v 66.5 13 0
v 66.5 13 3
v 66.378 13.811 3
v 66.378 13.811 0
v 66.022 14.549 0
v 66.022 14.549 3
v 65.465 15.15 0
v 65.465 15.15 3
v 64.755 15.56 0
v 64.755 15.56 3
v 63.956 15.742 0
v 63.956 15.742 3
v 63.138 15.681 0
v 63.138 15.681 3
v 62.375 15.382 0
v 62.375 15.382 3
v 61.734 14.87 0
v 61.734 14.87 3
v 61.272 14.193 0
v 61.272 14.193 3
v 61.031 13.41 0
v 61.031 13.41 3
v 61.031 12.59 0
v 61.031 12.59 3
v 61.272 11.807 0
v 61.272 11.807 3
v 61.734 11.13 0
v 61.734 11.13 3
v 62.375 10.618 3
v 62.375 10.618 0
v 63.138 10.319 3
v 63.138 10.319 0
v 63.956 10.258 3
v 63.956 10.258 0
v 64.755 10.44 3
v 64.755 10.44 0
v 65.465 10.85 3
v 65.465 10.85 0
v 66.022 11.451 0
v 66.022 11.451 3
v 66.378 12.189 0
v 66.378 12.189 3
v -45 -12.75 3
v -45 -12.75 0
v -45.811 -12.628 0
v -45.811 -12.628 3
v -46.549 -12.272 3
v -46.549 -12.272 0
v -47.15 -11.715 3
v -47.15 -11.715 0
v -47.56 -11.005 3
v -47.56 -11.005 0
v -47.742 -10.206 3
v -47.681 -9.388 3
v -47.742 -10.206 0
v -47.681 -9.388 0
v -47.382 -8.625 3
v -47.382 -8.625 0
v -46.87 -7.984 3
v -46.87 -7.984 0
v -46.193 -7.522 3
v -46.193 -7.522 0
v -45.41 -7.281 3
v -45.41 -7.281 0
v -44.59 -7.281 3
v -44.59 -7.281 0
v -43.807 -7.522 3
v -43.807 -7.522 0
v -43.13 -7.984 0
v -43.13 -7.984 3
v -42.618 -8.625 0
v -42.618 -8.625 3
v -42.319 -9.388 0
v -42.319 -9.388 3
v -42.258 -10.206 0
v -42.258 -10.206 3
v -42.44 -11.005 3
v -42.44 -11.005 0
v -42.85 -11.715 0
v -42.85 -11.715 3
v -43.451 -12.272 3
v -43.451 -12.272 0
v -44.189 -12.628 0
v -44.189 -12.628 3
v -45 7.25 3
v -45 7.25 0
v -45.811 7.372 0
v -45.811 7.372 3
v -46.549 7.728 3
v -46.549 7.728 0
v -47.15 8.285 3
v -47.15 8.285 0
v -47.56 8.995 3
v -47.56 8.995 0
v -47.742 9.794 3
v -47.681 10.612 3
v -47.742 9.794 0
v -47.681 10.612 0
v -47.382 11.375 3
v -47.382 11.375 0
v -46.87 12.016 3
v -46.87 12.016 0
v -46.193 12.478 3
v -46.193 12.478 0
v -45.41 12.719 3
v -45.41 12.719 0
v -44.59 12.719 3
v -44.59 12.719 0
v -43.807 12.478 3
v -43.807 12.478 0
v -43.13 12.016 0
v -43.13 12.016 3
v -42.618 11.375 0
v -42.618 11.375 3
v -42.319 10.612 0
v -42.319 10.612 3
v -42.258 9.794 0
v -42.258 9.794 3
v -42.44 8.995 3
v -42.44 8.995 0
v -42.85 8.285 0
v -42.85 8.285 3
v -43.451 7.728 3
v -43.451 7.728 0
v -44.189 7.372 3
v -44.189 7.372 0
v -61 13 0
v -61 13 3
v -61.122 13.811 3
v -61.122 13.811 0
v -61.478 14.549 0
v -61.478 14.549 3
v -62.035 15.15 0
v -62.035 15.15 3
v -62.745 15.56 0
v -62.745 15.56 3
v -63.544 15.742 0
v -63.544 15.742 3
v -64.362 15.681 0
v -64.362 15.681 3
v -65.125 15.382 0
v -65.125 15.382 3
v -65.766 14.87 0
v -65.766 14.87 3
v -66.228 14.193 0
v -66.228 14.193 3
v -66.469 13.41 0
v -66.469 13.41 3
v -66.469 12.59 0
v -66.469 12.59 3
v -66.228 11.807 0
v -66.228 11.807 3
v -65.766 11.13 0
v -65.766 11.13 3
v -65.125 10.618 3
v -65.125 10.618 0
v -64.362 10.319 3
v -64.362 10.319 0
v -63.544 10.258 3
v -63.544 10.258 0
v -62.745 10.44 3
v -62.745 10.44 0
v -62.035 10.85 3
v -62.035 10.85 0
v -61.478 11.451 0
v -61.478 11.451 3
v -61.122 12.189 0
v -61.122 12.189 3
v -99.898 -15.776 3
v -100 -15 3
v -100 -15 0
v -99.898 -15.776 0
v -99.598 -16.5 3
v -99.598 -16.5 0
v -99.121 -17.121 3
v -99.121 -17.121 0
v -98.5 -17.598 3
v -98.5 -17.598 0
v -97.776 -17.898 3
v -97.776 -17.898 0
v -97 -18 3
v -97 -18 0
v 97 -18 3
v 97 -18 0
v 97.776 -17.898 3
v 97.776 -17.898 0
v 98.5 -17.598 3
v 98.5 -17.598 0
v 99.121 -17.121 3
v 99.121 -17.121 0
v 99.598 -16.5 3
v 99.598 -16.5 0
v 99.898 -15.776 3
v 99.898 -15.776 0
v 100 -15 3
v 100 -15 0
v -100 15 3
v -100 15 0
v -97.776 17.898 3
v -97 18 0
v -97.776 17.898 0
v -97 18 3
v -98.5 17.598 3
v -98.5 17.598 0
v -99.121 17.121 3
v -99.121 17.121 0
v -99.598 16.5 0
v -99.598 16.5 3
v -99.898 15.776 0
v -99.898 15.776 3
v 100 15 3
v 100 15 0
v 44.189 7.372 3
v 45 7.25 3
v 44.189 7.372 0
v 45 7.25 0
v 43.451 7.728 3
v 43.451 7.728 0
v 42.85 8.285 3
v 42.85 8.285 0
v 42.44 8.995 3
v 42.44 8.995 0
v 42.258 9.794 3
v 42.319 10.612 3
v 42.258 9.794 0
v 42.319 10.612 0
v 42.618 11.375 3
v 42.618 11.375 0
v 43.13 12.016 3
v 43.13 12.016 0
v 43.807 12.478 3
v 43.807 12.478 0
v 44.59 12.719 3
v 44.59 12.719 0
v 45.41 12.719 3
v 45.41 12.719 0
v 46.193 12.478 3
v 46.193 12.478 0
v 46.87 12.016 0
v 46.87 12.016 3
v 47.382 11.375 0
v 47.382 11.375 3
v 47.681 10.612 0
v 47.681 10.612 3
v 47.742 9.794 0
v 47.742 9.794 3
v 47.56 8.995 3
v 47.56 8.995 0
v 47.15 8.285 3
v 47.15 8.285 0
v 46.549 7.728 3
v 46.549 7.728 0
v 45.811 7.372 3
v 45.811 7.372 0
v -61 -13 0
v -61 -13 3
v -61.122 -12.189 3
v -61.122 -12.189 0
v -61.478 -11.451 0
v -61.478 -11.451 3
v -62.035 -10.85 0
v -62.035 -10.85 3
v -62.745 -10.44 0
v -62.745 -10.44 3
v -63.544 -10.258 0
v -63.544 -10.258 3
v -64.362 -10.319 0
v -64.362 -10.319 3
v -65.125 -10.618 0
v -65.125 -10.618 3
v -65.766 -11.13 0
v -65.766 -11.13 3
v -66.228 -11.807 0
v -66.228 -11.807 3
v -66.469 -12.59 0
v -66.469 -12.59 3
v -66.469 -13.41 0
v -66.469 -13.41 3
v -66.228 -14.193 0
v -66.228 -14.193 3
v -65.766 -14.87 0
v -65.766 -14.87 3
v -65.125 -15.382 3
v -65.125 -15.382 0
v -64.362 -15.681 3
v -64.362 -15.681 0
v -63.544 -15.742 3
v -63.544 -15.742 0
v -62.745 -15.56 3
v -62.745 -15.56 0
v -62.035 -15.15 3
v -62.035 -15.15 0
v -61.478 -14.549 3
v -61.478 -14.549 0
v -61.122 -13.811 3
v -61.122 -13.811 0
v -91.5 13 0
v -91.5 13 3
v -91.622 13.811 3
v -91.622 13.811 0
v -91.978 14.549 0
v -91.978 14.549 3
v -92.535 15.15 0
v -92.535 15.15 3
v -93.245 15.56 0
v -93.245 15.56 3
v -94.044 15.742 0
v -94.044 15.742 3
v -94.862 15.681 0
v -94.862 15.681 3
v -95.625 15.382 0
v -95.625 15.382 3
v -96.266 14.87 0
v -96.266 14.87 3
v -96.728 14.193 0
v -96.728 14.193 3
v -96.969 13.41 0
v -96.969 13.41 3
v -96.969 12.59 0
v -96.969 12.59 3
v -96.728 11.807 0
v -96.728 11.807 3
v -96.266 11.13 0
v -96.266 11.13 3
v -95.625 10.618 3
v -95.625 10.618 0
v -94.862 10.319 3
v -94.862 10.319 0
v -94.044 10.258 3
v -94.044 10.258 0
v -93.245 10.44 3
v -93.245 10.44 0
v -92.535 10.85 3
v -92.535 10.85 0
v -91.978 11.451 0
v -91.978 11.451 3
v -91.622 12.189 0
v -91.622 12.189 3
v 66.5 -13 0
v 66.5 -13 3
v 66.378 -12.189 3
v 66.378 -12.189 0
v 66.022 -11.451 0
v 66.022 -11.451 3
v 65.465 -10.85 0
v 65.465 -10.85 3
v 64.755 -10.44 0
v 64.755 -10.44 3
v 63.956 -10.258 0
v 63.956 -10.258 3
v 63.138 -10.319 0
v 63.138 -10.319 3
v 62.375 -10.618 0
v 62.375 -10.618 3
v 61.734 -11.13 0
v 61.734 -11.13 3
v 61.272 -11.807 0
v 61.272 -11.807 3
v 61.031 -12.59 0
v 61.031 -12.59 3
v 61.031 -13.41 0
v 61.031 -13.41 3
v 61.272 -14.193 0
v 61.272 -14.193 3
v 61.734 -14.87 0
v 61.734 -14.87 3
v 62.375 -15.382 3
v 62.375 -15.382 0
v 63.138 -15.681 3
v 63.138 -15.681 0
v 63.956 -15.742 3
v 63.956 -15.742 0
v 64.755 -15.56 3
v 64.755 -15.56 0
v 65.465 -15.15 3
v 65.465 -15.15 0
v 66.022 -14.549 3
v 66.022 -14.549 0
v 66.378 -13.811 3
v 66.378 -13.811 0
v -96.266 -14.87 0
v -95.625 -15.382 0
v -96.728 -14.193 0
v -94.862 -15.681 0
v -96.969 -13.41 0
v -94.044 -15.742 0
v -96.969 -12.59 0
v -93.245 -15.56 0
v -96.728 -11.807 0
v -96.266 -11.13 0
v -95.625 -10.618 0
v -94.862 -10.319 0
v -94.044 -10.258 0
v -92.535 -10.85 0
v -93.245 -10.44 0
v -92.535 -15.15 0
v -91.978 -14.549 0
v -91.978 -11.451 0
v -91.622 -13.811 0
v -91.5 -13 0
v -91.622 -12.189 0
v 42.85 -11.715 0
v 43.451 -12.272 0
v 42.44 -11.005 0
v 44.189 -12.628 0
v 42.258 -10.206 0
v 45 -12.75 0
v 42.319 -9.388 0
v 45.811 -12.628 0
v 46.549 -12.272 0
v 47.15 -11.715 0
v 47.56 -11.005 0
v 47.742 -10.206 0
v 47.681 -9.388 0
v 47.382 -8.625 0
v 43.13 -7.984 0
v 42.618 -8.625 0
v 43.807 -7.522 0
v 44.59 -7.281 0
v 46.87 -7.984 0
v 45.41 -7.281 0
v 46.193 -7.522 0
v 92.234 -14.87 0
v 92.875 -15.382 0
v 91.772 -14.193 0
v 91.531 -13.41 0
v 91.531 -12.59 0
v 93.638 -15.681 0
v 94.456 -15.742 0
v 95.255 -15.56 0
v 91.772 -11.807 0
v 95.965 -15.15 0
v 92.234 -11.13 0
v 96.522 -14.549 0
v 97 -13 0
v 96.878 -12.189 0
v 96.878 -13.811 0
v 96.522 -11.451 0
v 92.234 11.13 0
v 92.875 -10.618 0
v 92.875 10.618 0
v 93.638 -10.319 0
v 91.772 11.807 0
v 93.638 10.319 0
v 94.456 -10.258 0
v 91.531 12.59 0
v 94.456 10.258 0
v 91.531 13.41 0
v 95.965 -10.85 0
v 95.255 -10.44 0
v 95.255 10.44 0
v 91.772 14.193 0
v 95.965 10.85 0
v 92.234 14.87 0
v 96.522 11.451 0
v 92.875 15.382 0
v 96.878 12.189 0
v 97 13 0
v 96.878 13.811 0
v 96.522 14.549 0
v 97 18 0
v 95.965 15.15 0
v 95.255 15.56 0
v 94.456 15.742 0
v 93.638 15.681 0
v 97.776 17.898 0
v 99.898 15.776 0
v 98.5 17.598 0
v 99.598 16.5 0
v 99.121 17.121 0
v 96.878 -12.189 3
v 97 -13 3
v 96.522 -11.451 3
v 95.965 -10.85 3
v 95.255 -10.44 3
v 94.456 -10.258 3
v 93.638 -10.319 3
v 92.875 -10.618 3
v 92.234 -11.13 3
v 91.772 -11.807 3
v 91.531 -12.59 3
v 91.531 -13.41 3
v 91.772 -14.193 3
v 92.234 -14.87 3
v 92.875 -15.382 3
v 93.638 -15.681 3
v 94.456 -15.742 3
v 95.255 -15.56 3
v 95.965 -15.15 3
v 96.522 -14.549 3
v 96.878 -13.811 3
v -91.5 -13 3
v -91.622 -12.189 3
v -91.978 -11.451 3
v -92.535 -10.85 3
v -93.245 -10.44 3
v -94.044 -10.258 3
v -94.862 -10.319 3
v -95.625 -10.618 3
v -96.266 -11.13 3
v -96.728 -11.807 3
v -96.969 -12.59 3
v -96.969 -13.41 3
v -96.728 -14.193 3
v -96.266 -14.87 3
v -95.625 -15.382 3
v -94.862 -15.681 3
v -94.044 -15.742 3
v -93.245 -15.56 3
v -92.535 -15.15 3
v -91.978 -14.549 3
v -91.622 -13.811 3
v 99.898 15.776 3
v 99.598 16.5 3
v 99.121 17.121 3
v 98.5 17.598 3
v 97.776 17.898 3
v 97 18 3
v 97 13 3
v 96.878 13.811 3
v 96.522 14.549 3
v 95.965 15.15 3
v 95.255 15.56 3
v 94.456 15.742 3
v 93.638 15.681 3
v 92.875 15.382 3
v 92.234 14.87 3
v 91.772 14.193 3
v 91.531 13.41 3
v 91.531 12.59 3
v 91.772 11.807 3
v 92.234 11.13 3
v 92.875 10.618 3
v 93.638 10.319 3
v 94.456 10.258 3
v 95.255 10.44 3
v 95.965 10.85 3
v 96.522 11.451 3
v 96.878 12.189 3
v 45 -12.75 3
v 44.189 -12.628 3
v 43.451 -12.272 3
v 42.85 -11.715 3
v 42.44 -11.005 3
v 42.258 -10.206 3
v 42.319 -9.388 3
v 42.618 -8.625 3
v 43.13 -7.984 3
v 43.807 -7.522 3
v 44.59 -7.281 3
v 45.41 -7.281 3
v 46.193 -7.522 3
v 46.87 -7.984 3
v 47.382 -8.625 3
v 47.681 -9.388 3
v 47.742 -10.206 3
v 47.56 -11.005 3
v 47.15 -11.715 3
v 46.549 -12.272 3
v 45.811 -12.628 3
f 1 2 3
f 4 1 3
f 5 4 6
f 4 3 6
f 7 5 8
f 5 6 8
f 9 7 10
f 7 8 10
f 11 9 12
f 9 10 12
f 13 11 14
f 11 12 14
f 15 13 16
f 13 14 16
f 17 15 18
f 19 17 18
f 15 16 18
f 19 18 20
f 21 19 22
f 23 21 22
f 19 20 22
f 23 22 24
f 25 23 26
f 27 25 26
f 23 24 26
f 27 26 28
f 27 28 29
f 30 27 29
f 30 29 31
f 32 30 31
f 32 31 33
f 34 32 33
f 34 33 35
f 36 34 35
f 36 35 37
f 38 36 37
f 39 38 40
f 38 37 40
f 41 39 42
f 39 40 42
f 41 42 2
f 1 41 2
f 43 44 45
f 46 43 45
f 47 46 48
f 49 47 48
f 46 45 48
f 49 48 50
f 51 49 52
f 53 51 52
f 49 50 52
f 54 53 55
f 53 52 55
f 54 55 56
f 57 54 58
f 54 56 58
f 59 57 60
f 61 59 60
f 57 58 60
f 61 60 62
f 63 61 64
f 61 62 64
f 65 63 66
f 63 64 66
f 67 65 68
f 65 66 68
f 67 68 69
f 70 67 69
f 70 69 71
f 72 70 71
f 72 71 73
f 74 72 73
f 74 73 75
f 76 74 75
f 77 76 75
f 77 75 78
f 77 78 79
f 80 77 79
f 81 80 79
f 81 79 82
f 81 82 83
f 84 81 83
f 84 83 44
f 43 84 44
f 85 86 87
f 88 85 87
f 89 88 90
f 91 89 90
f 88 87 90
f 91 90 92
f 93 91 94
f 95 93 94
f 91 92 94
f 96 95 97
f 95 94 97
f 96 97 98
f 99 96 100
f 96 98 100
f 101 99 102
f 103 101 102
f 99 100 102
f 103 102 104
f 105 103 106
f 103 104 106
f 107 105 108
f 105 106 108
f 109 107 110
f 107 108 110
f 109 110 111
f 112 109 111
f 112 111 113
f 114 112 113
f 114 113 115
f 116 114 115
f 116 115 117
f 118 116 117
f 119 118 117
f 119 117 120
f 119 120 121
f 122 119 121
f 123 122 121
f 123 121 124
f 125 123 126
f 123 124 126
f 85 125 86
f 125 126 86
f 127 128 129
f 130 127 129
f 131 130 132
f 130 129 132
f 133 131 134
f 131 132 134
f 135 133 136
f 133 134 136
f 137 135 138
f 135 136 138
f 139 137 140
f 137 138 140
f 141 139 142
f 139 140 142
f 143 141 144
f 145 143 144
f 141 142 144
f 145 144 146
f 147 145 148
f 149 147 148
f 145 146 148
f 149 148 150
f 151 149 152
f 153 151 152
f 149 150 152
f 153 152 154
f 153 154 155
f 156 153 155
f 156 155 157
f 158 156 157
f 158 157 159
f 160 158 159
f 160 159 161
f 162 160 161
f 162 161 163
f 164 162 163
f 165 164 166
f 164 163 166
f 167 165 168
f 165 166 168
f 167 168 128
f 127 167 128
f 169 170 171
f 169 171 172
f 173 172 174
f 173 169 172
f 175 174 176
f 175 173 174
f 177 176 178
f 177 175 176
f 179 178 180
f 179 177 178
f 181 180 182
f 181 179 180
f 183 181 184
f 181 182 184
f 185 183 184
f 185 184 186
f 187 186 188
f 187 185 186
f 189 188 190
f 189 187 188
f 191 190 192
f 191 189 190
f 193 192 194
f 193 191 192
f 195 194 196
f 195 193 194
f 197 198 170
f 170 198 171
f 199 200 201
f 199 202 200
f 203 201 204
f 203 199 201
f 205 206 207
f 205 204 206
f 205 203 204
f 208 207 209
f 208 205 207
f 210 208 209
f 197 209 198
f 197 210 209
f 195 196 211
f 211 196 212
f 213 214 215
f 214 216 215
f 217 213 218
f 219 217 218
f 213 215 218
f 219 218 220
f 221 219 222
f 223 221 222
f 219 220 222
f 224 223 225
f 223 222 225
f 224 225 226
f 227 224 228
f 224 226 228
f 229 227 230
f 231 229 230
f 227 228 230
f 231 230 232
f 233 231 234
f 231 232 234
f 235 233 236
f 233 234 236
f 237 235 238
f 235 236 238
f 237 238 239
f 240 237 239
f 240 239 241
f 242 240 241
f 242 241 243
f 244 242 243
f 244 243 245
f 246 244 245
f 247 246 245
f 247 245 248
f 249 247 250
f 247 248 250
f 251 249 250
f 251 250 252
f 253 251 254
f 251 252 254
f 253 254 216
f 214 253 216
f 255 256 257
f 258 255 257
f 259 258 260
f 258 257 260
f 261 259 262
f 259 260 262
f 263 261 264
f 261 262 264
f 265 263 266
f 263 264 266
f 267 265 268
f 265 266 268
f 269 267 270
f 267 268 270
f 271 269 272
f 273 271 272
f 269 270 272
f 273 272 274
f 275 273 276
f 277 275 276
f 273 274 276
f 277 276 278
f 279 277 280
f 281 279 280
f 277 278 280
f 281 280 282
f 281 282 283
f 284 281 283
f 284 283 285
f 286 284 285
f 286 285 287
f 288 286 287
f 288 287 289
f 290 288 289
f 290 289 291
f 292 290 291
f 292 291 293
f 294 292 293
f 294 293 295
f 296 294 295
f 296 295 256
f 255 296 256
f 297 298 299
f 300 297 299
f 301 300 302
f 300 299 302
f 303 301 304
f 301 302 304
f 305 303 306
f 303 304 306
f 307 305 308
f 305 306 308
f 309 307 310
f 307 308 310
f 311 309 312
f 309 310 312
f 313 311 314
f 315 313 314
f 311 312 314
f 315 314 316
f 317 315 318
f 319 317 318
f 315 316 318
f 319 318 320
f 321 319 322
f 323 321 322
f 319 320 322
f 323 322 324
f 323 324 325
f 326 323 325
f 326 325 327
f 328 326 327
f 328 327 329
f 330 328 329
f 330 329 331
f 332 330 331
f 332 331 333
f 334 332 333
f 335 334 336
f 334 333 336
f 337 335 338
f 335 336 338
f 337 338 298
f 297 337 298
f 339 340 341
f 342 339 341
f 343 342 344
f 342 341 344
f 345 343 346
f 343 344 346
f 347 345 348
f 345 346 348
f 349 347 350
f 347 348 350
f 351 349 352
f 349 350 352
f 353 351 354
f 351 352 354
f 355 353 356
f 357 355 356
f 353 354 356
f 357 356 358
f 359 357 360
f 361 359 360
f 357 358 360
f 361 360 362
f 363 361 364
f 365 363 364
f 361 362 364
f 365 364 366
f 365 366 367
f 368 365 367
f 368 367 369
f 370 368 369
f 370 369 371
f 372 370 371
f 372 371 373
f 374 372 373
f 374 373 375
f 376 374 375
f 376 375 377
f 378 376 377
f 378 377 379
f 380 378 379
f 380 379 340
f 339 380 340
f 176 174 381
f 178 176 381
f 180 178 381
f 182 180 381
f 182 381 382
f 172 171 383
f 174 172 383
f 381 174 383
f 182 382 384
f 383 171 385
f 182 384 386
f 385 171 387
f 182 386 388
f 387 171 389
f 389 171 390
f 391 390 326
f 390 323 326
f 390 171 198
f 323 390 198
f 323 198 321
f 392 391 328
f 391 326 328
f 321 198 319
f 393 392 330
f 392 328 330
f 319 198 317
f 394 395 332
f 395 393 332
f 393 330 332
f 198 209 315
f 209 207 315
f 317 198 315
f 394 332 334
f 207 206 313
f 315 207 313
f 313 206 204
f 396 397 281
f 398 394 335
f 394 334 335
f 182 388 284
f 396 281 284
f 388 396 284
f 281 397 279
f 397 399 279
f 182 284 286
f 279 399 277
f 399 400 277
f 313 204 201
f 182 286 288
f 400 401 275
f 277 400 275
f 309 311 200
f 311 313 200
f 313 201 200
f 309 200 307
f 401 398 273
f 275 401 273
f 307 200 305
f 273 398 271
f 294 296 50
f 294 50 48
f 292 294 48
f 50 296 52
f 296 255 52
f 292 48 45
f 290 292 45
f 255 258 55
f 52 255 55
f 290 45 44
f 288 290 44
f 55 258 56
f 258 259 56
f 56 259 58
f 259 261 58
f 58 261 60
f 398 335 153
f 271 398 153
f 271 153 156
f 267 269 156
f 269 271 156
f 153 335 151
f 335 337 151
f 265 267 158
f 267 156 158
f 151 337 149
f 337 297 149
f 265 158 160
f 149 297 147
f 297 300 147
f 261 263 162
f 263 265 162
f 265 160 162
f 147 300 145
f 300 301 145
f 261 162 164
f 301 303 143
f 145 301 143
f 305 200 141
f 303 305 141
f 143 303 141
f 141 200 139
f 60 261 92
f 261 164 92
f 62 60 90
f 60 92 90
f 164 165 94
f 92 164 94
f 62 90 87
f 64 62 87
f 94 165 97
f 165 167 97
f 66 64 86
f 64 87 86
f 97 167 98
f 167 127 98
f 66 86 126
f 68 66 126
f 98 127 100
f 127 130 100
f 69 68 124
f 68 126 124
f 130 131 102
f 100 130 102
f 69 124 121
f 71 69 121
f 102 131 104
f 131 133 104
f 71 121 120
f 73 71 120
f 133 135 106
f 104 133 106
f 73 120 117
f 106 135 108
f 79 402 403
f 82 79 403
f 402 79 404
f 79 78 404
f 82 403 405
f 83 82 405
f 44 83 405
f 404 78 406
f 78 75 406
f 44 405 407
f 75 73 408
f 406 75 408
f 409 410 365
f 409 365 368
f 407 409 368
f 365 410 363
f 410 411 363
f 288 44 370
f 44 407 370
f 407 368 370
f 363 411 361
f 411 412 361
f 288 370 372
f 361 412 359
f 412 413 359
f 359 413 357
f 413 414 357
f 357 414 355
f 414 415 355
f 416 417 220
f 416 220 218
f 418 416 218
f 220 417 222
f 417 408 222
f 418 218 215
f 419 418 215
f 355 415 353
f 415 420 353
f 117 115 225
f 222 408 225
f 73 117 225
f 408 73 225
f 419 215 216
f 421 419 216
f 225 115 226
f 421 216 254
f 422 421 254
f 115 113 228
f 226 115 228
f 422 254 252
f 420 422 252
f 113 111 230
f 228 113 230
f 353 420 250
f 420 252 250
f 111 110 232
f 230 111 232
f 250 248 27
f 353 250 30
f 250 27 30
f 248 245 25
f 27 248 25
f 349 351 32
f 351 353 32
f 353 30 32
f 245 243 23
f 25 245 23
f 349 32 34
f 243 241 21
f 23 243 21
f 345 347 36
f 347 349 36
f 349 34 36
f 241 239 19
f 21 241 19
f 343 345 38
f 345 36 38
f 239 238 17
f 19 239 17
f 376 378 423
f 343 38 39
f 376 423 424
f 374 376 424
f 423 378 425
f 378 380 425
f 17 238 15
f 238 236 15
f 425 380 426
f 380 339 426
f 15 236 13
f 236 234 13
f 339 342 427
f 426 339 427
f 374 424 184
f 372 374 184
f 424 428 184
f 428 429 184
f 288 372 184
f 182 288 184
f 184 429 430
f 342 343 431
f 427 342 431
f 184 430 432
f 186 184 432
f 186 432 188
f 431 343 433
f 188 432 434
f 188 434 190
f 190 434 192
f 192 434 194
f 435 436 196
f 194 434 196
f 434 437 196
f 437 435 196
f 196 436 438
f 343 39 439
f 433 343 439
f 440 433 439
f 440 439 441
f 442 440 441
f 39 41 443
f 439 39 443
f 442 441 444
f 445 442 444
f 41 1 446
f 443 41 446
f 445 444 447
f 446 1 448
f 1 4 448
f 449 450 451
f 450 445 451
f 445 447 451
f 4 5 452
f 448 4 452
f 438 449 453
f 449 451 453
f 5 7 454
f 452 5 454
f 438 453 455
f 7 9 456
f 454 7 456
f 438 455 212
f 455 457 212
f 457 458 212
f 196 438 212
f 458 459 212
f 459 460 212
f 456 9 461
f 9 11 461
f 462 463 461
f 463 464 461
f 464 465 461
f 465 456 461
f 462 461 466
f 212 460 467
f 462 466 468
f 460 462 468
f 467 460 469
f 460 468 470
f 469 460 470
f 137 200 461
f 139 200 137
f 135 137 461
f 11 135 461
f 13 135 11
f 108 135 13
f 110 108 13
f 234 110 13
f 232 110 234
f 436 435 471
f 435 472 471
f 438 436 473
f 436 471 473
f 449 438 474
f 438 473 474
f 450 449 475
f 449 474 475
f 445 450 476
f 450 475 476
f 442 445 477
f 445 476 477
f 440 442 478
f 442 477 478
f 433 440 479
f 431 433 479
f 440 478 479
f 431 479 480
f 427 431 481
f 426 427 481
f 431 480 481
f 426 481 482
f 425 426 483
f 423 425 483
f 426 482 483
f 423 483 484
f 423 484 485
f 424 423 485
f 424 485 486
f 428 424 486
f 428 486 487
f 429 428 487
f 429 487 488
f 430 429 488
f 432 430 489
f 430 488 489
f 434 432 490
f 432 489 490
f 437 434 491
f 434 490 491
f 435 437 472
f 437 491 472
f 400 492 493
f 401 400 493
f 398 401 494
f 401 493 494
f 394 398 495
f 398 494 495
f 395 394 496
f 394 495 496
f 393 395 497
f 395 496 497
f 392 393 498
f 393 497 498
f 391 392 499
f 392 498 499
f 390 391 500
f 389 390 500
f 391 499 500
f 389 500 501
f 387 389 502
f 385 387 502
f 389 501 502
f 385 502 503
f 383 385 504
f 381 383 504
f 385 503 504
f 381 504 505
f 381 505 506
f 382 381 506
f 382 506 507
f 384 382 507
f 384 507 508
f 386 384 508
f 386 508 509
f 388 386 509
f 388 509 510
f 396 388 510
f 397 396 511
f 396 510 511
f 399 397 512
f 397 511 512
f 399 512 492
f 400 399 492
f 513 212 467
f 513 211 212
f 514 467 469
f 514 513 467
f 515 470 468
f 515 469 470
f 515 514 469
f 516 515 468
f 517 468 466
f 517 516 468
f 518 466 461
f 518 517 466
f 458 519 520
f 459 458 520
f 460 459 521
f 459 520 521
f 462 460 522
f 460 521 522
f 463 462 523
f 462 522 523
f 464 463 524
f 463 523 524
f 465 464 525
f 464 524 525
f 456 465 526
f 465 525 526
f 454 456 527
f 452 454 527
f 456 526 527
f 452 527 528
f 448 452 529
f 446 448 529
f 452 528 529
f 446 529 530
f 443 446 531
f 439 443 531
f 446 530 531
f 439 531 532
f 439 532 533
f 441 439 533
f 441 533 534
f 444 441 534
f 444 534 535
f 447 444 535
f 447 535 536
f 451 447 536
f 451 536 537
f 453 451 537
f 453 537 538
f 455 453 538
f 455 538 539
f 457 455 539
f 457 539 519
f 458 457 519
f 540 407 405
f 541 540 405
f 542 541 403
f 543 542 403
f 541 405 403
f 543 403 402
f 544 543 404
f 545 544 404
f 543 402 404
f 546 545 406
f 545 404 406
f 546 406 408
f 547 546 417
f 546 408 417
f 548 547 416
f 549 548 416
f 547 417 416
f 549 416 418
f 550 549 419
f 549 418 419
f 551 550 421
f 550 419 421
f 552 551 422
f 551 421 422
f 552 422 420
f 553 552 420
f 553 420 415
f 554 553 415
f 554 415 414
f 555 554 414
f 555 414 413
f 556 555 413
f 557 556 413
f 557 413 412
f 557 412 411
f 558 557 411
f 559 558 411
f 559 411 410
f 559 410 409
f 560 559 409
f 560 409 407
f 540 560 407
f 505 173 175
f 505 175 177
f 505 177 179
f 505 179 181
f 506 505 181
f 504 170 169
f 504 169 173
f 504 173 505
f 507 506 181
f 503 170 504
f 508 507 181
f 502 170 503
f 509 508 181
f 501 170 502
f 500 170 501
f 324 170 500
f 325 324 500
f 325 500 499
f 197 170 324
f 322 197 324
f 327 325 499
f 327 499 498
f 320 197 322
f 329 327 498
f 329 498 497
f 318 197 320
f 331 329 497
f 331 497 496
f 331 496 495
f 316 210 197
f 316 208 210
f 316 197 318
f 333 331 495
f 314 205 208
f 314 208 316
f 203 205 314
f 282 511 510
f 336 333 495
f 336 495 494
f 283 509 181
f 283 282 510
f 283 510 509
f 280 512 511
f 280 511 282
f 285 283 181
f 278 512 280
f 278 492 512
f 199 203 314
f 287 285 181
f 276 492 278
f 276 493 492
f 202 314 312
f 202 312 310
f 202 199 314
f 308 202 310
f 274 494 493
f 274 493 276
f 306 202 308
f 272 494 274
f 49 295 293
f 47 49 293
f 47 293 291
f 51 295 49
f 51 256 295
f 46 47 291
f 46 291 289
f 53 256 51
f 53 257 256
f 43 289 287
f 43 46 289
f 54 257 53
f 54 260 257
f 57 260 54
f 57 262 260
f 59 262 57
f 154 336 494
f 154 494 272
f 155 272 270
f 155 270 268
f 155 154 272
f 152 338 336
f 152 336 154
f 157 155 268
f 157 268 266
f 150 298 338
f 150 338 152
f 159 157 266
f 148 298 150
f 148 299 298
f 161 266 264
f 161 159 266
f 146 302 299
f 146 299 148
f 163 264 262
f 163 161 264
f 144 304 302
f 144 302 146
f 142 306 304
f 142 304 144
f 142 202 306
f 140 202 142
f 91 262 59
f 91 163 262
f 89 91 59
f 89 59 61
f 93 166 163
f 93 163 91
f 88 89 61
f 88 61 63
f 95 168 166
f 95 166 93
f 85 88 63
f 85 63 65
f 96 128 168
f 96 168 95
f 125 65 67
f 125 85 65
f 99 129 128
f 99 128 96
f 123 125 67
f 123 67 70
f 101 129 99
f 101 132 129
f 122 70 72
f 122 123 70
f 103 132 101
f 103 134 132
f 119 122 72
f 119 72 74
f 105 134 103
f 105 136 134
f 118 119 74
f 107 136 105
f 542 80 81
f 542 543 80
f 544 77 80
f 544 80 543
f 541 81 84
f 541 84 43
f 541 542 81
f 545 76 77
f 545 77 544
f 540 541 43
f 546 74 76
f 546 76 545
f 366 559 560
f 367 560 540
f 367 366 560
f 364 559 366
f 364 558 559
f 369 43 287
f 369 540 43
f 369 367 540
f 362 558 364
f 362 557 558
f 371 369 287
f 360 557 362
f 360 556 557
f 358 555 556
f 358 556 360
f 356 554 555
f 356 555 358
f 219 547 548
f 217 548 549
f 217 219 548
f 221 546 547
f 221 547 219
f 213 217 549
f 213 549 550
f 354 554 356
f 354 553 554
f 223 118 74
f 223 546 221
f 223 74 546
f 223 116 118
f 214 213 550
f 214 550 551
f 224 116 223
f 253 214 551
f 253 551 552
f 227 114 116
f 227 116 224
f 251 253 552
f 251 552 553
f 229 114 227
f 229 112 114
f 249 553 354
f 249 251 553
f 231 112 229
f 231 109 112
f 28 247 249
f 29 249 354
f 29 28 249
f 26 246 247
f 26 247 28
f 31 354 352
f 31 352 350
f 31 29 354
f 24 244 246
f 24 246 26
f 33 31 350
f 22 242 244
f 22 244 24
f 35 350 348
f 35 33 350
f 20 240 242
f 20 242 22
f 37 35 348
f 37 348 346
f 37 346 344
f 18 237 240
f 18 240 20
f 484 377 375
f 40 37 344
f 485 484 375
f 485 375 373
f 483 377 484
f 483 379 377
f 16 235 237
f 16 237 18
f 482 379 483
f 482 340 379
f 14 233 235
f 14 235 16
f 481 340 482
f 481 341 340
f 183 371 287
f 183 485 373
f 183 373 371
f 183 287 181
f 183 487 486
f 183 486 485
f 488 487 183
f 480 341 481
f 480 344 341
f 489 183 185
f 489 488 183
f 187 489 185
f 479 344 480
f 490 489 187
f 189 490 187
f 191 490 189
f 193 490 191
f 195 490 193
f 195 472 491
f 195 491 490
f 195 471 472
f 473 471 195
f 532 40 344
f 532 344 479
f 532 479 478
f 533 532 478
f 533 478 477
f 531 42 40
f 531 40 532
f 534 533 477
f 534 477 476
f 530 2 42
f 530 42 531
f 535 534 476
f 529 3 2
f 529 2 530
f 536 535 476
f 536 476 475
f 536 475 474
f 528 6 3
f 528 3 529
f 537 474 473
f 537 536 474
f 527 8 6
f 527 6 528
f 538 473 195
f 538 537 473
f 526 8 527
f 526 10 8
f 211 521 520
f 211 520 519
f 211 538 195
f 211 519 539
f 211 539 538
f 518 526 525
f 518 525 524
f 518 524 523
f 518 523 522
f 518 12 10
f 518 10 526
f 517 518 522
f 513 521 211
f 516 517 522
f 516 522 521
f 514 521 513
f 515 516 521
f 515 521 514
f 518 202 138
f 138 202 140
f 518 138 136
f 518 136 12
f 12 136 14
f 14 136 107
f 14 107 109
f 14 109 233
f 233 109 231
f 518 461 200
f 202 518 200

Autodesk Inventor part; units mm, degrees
ref_plane "YZ Plane" through (0, 0, 0) normal (1, 0, 0) x (0, 1, 0)
ref_plane "XZ Plane" through (0, 0, 0) normal (0, 1, 0) x (-1, 0, 0)
ref_plane "XY Plane" through (0, 0, 0) normal (0, 0, 1) x (1, 0, 0)
sketch "Sketch1" plane through (0, 0, 0) normal (0, 0, 1) x (1, 0, 0)
  line L0 (-100, -18) -> (100, -18)
  line L1 (100, -18) -> (100, 18)
  line L2 (100, 18) -> (-100, 18)
  line L3 (-100, 18) -> (-100, -18)
  line L4 (-100, -18) -> (100, 18) construction
  line L5 (100, -18) -> (-100, 18) construction
  point P0 (0, 0)
  dimension "d0" = 200
  dimension "d1" = 36
extrude "Extrusion1" add sketch "Sketch1" along normal blind 3
sketch "Sketch2" plane through (0, 0, 3) normal (0, 0, 1) x (1, 0, 0)
  line L0 (-94.25, -13) -> (-63.75, -13)
  line L1 (-63.75, -13) -> (-63.75, 13)
  line L2 (-63.75, 13) -> (-94.25, 13)
  line L3 (-94.25, 13) -> (-94.25, -13)
  line L4 (-94.25, -13) -> (-63.75, 13) construction
  line L5 (-63.75, -13) -> (-94.25, 13) construction
  line L6 (100, 18) -> (-100, 18) projected
  line L7 (-100, -18) -> (-58, -18)
  line L8 (-58, -18) -> (-58, 18)
  line L9 (-58, 18) -> (-100, 18)
  line L10 (-100, 18) -> (-100, -18)
  line L11 (-100, -18) -> (-58, 18) construction
  line L12 (-58, -18) -> (-100, 18) construction
  line L13 (-100, 18) -> (-100, -18) projected
  circle A0 centre (-94.25, 13) radius 2.75
  circle A1 centre (-63.75, 13) radius 2.75
  circle A2 centre (-94.25, -13) radius 2.75
  circle A3 centre (-63.75, -13) radius 2.75
  line L14 (63.75, -13) -> (94.25, -13)
  line L15 (94.25, -13) -> (94.25, 13)
  line L16 (94.25, 13) -> (63.75, 13)
  line L17 (63.75, 13) -> (63.75, -13)
  line L18 (63.75, -13) -> (94.25, 13) construction
  line L19 (94.25, -13) -> (63.75, 13) construction
  line L20 (58, -18) -> (100, -18)
  line L21 (100, -18) -> (100, 18)
  line L22 (100, 18) -> (58, 18)
  line L23 (58, 18) -> (58, -18)
  line L24 (58, -18) -> (100, 18) construction
  line L25 (100, -18) -> (58, 18) construction
  circle A4 centre (63.75, 13) radius 2.75
  circle A5 centre (94.25, 13) radius 2.75
  circle A6 centre (63.75, -13) radius 2.75
  circle A7 centre (94.25, -13) radius 2.75
  line L26 (100, -18) -> (100, 18) projected
  point P0 (0, 0)
  point P1 (-79, 0)
  point P2 (-79, 0)
  point P3 (79, 0)
  point P4 (79, 0)
  dimension "d4" = 30.5
  dimension "d5" = 26
  dimension "d6" = 42
  dimension "d7" = 0
  dimension "d8" = 0
  dimension "d9" = 5.5
  dimension "d10" = 5.5
  dimension "d11" = 5.5
  dimension "d12" = 5.5
  dimension "d13" = 30.5
  dimension "d14" = 26
  dimension "d15" = 42
  dimension "d16" = 0
  dimension "d17" = 5.5
  dimension "d18" = 5.5
  dimension "d19" = 5.5
  dimension "d20" = 5.5
  dimension "d21" = 0
  dimension "d22" = 36
extrude "Extrusion2" cut sketch "Sketch2" against normal blind 3 contours L3 A2 L0 | L0 A2 L3 | A3 L1 L0 | L0 L1 A3 | A0 L2 L3 | L3 L2 A0 | A1 L2 L1 | L1 L2 A1 | L17 A6 L14 | L14 A6 L17 | A7 L15 L14 | L14 L15 A7 | A4 L16 L17 | L17 L16 A4 | A5 L16 L15 | L15 L16 A5
fillet "Fillet1" radius 3 4 edges at (100, 18, 1.5) (100, -18, 1.5) (-100, -18, 1.5) (-100, 18, 1.5)
sketch "Sketch3" plane through (0, 0, 3) normal (0, 0, 1) x (1, 0, 0)
  line L0 (-45, -10) -> (45, -10)
  line L1 (45, -10) -> (45, 10)
  line L2 (45, 10) -> (-45, 10)
  line L3 (-45, 10) -> (-45, -10)
  line L4 (-45, -10) -> (45, 10) construction
  line L5 (45, -10) -> (-45, 10) construction
  point P0 (0, 0)
  dimension "d26" = 90
  dimension "d27" = 20
hole "Hole1" at (-45, 10, 3) at (45, 10, 3) at (45, -10, 3) at (-45, -10, 3) direction (0, 0, -1) diameter 5.5 end through all
properties part number "de ga con truot"
